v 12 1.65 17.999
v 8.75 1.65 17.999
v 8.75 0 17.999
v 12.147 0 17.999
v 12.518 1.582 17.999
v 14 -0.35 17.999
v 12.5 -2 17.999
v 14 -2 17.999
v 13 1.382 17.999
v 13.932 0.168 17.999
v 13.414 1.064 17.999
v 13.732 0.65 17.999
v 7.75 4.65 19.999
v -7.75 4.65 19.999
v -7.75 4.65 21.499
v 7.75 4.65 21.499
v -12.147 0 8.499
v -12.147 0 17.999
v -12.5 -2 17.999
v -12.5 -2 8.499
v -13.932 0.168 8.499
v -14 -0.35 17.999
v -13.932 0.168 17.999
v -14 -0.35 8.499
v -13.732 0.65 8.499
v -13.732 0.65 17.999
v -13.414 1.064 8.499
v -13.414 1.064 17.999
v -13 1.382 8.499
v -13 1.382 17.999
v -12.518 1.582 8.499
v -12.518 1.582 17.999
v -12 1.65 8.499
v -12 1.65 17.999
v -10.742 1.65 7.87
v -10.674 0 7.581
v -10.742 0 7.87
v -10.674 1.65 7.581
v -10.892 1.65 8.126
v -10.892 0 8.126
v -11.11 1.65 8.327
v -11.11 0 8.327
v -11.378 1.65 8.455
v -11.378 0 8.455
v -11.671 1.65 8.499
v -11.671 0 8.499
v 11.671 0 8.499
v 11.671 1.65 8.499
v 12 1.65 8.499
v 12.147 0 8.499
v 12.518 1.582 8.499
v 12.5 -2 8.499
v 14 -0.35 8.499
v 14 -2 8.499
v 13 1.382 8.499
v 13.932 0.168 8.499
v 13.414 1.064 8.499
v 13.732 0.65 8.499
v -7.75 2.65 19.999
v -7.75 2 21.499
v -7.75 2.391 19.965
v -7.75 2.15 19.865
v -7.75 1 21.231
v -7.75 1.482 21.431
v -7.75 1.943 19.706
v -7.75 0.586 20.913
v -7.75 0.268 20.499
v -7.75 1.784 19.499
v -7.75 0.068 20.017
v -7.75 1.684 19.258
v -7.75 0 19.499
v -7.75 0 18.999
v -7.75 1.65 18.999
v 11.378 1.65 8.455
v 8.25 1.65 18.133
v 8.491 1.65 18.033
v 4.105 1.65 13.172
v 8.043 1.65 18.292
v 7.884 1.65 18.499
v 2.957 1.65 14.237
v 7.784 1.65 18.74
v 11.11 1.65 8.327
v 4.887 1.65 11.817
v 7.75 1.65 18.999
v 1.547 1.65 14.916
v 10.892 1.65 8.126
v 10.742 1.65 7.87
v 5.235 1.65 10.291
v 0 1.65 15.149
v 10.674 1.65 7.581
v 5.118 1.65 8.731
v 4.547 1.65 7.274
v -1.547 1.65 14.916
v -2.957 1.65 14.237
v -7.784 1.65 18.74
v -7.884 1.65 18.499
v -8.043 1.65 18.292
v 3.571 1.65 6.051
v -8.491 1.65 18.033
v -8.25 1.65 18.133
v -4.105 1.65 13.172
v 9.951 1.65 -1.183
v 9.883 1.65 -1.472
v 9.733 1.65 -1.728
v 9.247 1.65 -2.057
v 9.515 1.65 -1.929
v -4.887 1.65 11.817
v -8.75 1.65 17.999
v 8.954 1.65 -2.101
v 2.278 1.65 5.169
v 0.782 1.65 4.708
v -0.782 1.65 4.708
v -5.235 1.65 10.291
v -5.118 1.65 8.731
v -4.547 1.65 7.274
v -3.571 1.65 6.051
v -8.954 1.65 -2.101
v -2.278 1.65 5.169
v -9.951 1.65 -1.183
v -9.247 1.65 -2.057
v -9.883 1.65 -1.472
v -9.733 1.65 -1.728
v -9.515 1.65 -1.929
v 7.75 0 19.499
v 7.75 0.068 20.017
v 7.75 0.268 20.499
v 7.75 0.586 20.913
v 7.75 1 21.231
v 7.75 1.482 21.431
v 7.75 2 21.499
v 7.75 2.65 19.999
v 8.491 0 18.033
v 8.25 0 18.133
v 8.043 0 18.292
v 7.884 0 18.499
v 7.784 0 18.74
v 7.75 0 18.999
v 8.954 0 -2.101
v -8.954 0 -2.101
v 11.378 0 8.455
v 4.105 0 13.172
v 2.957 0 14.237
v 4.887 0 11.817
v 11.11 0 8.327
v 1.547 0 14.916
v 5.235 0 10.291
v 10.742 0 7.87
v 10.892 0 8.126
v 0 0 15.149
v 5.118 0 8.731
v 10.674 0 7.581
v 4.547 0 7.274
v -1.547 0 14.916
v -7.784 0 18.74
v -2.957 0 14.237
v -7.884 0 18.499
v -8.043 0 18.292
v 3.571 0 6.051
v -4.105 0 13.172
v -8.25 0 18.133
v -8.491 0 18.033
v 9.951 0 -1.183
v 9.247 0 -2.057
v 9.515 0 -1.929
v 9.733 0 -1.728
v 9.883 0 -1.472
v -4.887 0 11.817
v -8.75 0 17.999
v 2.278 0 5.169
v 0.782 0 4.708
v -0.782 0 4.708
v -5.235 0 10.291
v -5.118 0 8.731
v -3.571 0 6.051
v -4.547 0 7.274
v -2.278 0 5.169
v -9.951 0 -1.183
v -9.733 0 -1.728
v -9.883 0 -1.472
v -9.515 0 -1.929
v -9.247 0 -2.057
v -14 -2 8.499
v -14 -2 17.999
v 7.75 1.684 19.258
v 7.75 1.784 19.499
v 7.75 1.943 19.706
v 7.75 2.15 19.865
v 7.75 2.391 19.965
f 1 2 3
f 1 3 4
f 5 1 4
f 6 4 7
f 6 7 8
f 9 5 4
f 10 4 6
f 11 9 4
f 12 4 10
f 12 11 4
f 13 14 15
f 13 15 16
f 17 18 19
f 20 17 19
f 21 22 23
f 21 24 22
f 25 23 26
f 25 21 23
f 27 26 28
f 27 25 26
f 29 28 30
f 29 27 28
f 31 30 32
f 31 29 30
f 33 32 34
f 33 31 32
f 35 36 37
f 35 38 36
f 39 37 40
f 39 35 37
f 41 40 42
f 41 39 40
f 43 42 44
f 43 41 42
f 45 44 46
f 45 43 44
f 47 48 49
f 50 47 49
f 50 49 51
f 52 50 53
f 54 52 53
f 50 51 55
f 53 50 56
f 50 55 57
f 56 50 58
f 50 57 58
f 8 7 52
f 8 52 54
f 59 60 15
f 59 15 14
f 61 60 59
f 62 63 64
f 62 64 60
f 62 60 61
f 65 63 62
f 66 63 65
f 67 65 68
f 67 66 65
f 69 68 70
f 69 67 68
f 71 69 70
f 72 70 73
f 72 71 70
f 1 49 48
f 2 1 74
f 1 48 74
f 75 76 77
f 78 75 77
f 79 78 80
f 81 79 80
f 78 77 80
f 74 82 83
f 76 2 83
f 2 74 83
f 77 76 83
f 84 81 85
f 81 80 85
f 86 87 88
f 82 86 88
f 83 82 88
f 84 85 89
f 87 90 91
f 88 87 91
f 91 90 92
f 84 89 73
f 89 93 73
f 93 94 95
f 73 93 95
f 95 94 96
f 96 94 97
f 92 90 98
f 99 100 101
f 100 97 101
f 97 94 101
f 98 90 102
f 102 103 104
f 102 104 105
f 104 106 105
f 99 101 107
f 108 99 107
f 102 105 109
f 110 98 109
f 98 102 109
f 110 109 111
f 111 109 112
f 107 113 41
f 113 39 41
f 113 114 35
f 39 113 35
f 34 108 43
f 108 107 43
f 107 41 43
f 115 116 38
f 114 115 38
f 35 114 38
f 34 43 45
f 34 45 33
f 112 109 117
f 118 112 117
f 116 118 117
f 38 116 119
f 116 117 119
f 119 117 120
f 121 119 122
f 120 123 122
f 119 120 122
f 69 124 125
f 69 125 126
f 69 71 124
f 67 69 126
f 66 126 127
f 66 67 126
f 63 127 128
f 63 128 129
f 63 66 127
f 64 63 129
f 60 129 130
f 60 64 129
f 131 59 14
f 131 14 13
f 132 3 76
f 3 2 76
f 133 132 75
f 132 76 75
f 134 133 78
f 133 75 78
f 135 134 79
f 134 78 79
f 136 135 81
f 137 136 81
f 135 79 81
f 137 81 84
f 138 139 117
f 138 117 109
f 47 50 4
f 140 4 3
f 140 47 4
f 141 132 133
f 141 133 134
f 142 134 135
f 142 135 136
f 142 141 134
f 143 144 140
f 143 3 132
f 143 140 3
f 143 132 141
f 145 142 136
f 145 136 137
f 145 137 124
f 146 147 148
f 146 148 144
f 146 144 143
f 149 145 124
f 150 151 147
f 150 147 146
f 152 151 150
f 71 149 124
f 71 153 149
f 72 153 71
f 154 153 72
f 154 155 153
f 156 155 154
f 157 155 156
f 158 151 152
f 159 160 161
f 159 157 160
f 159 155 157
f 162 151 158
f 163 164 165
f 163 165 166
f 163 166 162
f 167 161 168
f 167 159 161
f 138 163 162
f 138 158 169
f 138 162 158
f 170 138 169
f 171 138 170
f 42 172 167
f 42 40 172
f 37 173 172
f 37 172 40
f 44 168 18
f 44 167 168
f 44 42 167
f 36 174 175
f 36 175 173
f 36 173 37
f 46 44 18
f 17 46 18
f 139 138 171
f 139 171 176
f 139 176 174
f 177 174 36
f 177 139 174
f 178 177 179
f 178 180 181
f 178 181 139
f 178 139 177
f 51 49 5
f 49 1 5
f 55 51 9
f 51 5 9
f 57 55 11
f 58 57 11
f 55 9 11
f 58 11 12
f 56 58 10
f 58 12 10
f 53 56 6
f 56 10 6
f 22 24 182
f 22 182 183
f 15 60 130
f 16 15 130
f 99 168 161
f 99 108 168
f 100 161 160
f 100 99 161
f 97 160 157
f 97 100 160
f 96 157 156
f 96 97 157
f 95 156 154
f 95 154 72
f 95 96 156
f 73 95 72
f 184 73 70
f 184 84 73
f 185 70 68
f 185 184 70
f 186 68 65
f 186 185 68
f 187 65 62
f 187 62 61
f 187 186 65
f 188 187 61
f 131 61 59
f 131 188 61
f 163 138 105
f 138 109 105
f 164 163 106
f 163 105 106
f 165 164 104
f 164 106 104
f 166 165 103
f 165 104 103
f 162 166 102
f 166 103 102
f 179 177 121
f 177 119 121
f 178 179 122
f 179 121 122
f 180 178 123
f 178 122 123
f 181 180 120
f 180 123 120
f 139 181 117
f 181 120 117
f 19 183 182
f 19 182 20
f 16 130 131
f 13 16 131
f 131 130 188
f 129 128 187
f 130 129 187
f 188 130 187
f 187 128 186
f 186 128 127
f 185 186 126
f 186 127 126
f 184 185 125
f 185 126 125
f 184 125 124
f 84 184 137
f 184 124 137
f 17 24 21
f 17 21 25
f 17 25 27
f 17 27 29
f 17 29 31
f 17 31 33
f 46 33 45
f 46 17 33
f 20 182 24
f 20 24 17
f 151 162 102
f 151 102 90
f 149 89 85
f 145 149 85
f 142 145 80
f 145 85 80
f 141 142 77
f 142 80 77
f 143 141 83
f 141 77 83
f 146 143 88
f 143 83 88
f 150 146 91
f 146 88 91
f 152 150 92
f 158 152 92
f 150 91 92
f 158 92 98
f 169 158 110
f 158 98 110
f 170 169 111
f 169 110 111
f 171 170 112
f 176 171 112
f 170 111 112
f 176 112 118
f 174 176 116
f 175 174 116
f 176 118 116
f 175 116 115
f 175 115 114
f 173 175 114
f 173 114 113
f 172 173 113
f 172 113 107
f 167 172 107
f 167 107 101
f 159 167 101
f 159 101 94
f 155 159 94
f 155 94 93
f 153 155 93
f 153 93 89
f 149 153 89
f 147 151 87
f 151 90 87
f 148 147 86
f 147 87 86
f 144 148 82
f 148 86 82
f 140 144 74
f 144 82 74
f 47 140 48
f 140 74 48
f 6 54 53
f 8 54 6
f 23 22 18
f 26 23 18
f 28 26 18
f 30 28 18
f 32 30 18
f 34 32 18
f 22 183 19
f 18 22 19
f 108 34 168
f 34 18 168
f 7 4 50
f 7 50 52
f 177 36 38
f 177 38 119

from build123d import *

# Parameters (mm, degrees)
RESSALTO_EXTRUS_O1_DEPTH = 1.65
ESBO_O2_W                = 15.5
ESBO_O2_H                = 1.5
RESSALTO_EXTRUS_O2_DEPTH = 3
ESBO_O3_W                = 1.5
ESBO_O3_H                = 9.5
RESSALTO_EXTRUS_O3_DEPTH = 2
ESBO_O4_R                = 5.25
CORTE_EXTRUS_O1_DEPTH    = 26.913997794
FILETE1_R                = 2
CHANFRO1_SIZE            = 0.352653961
CHANFRO1_SIZE_2          = 2
FILETE3_R                = 2
FILETE4_R                = 1
FILETE5_R                = 1
FILETE6_R                = 1
FILETE7_R                = 1


with BuildPart() as part:
    # Esboço1 → Ressalto-extrusão1 (new body)
    with BuildSketch(Plane(origin=(0, 0, 0), x_dir=(1, 0, 0), z_dir=(0, 1, 0))):
        Polygon((-9.875, 2.10086556), (9.875, 2.10086556), (10.75, -8.49913444), (14, -8.49913444), (14, -17.99913444), (7.75, -17.99913444), (7.75, -21.49913444), (-7.75, -21.49913444), (-7.75, -17.99913444), (-14, -17.99913444), (-14, -8.49913444), (-10.75, -8.49913444), align=None)
    extrude(amount=RESSALTO_EXTRUS_O1_DEPTH)

    # Esboço2 → Ressalto-extrusão2 (add)
    with BuildSketch(Plane(origin=(0, 1.65, 0), x_dir=(1, 0, 0), z_dir=(0, 1, 0))):
        with Locations((0, -20.74913444)):
            Rectangle(ESBO_O2_W, ESBO_O2_H)
    extrude(amount=RESSALTO_EXTRUS_O2_DEPTH)

    # Esboço3 → Ressalto-extrusão3 (add)
    with BuildSketch(Plane.XZ):
        with Locations((-13.25, 13.24913444)):
            Rectangle(ESBO_O3_W, ESBO_O3_H)
        with Locations((13.25, 13.24913444)):
            Rectangle(ESBO_O3_W, ESBO_O3_H)
    extrude(amount=RESSALTO_EXTRUS_O3_DEPTH)

    # Esboço4 → Corte-extrusão1 (cut, through all)
    with BuildSketch(Plane(origin=(0, 1.65, 0), x_dir=(1, 0, 0), z_dir=(0, 1, 0))):
        with Locations(Location((0, -9.89913444, 0), (0, 0, 270))):
            Circle(ESBO_O4_R)
    extrude(amount=-CORTE_EXTRUS_O1_DEPTH, mode=Mode.SUBTRACT)

    # Filete1
    filete1_edges = [part.edges().sort_by_distance(p)[0] for p in [
        (14, 1.65, 13.24913444),
        (-14, 1.65, 13.24913444),
    ]]
    fillet(filete1_edges, radius=FILETE1_R)

    # Chanfro1
    # the kernel refuses this chamfer: 2, 0.352653961 mm, written as the material it adds along each edge
    with BuildSketch(Plane(origin=(12.5, 0, 17.99913444), x_dir=(-0.9776715712462587, 0.21013876076743104, 0), z_dir=(0, 0, -1))) as chanfro1_piece_1_section:
        Polygon((CHANFRO1_SIZE * 0.977671572402, -CHANFRO1_SIZE * 0.210138761016), (-CHANFRO1_SIZE_2 * 0.210138760767, -CHANFRO1_SIZE_2 * 0.977671571246), (0, 0), align=None)
    chanfro1_piece_1 = extrude(amount=9.5, mode=Mode.PRIVATE)
    chanfro1_piece_1 = split(chanfro1_piece_1, bisect_by=Plane(origin=(12.403792596, -2, 13.24913444), z_dir=(0, 1, 0)), keep=Keep.TOP, mode=Mode.PRIVATE)
    add(chanfro1_piece_1)
    with BuildSketch(Plane(origin=(-12.5, 0, 17.99913444), x_dir=(0.9776715712462587, 0.21013876076743104, 0), z_dir=(0, 0, -1))) as chanfro1_piece_2_section:
        Polygon((CHANFRO1_SIZE * 0.977671572402, CHANFRO1_SIZE * 0.210138761016), (-CHANFRO1_SIZE_2 * 0.210138760767, CHANFRO1_SIZE_2 * 0.977671571246), (0, 0), align=None)
    chanfro1_piece_2 = extrude(amount=9.5, mode=Mode.PRIVATE)
    chanfro1_piece_2 = split(chanfro1_piece_2, bisect_by=Plane(origin=(-12.403792596, -2, 13.24913444), z_dir=(0, 1, 0)), keep=Keep.TOP, mode=Mode.PRIVATE)
    add(chanfro1_piece_2)

    # Filete3
    filete3_edges = [part.edges().sort_by_distance(p)[0] for p in [
        (0, 0, 21.49913444),
    ]]
    fillet(filete3_edges, radius=FILETE3_R)

    # Filete4
    filete4_edges = [part.edges().sort_by_distance(p)[0] for p in [
        (0, 1.65, 19.99913444),
    ]]
    fillet(filete4_edges, radius=FILETE4_R)

    # Filete5
    filete5_edges = [part.edges().sort_by_distance(p)[0] for p in [
        (-9.875, 0.825, -2.10086556),
    ]]
    fillet(filete5_edges, radius=FILETE5_R)

    # Filete6
    filete6_edges = [part.edges().sort_by_distance(p)[0] for p in [
        (9.875, 0.825, -2.10086556),
    ]]
    fillet(filete6_edges, radius=FILETE6_R)

    # Filete7
    filete7_edges = [part.edges().sort_by_distance(p)[0] for p in [
        (-10.75, 0.825, 8.49913444),
        (-7.75, 0.825, 17.99913444),
        (7.75, 0.825, 17.99913444),
        (10.75, 0.825, 8.49913444),
    ]]
    fillet(filete7_edges, radius=FILETE7_R)


solid = part.part
